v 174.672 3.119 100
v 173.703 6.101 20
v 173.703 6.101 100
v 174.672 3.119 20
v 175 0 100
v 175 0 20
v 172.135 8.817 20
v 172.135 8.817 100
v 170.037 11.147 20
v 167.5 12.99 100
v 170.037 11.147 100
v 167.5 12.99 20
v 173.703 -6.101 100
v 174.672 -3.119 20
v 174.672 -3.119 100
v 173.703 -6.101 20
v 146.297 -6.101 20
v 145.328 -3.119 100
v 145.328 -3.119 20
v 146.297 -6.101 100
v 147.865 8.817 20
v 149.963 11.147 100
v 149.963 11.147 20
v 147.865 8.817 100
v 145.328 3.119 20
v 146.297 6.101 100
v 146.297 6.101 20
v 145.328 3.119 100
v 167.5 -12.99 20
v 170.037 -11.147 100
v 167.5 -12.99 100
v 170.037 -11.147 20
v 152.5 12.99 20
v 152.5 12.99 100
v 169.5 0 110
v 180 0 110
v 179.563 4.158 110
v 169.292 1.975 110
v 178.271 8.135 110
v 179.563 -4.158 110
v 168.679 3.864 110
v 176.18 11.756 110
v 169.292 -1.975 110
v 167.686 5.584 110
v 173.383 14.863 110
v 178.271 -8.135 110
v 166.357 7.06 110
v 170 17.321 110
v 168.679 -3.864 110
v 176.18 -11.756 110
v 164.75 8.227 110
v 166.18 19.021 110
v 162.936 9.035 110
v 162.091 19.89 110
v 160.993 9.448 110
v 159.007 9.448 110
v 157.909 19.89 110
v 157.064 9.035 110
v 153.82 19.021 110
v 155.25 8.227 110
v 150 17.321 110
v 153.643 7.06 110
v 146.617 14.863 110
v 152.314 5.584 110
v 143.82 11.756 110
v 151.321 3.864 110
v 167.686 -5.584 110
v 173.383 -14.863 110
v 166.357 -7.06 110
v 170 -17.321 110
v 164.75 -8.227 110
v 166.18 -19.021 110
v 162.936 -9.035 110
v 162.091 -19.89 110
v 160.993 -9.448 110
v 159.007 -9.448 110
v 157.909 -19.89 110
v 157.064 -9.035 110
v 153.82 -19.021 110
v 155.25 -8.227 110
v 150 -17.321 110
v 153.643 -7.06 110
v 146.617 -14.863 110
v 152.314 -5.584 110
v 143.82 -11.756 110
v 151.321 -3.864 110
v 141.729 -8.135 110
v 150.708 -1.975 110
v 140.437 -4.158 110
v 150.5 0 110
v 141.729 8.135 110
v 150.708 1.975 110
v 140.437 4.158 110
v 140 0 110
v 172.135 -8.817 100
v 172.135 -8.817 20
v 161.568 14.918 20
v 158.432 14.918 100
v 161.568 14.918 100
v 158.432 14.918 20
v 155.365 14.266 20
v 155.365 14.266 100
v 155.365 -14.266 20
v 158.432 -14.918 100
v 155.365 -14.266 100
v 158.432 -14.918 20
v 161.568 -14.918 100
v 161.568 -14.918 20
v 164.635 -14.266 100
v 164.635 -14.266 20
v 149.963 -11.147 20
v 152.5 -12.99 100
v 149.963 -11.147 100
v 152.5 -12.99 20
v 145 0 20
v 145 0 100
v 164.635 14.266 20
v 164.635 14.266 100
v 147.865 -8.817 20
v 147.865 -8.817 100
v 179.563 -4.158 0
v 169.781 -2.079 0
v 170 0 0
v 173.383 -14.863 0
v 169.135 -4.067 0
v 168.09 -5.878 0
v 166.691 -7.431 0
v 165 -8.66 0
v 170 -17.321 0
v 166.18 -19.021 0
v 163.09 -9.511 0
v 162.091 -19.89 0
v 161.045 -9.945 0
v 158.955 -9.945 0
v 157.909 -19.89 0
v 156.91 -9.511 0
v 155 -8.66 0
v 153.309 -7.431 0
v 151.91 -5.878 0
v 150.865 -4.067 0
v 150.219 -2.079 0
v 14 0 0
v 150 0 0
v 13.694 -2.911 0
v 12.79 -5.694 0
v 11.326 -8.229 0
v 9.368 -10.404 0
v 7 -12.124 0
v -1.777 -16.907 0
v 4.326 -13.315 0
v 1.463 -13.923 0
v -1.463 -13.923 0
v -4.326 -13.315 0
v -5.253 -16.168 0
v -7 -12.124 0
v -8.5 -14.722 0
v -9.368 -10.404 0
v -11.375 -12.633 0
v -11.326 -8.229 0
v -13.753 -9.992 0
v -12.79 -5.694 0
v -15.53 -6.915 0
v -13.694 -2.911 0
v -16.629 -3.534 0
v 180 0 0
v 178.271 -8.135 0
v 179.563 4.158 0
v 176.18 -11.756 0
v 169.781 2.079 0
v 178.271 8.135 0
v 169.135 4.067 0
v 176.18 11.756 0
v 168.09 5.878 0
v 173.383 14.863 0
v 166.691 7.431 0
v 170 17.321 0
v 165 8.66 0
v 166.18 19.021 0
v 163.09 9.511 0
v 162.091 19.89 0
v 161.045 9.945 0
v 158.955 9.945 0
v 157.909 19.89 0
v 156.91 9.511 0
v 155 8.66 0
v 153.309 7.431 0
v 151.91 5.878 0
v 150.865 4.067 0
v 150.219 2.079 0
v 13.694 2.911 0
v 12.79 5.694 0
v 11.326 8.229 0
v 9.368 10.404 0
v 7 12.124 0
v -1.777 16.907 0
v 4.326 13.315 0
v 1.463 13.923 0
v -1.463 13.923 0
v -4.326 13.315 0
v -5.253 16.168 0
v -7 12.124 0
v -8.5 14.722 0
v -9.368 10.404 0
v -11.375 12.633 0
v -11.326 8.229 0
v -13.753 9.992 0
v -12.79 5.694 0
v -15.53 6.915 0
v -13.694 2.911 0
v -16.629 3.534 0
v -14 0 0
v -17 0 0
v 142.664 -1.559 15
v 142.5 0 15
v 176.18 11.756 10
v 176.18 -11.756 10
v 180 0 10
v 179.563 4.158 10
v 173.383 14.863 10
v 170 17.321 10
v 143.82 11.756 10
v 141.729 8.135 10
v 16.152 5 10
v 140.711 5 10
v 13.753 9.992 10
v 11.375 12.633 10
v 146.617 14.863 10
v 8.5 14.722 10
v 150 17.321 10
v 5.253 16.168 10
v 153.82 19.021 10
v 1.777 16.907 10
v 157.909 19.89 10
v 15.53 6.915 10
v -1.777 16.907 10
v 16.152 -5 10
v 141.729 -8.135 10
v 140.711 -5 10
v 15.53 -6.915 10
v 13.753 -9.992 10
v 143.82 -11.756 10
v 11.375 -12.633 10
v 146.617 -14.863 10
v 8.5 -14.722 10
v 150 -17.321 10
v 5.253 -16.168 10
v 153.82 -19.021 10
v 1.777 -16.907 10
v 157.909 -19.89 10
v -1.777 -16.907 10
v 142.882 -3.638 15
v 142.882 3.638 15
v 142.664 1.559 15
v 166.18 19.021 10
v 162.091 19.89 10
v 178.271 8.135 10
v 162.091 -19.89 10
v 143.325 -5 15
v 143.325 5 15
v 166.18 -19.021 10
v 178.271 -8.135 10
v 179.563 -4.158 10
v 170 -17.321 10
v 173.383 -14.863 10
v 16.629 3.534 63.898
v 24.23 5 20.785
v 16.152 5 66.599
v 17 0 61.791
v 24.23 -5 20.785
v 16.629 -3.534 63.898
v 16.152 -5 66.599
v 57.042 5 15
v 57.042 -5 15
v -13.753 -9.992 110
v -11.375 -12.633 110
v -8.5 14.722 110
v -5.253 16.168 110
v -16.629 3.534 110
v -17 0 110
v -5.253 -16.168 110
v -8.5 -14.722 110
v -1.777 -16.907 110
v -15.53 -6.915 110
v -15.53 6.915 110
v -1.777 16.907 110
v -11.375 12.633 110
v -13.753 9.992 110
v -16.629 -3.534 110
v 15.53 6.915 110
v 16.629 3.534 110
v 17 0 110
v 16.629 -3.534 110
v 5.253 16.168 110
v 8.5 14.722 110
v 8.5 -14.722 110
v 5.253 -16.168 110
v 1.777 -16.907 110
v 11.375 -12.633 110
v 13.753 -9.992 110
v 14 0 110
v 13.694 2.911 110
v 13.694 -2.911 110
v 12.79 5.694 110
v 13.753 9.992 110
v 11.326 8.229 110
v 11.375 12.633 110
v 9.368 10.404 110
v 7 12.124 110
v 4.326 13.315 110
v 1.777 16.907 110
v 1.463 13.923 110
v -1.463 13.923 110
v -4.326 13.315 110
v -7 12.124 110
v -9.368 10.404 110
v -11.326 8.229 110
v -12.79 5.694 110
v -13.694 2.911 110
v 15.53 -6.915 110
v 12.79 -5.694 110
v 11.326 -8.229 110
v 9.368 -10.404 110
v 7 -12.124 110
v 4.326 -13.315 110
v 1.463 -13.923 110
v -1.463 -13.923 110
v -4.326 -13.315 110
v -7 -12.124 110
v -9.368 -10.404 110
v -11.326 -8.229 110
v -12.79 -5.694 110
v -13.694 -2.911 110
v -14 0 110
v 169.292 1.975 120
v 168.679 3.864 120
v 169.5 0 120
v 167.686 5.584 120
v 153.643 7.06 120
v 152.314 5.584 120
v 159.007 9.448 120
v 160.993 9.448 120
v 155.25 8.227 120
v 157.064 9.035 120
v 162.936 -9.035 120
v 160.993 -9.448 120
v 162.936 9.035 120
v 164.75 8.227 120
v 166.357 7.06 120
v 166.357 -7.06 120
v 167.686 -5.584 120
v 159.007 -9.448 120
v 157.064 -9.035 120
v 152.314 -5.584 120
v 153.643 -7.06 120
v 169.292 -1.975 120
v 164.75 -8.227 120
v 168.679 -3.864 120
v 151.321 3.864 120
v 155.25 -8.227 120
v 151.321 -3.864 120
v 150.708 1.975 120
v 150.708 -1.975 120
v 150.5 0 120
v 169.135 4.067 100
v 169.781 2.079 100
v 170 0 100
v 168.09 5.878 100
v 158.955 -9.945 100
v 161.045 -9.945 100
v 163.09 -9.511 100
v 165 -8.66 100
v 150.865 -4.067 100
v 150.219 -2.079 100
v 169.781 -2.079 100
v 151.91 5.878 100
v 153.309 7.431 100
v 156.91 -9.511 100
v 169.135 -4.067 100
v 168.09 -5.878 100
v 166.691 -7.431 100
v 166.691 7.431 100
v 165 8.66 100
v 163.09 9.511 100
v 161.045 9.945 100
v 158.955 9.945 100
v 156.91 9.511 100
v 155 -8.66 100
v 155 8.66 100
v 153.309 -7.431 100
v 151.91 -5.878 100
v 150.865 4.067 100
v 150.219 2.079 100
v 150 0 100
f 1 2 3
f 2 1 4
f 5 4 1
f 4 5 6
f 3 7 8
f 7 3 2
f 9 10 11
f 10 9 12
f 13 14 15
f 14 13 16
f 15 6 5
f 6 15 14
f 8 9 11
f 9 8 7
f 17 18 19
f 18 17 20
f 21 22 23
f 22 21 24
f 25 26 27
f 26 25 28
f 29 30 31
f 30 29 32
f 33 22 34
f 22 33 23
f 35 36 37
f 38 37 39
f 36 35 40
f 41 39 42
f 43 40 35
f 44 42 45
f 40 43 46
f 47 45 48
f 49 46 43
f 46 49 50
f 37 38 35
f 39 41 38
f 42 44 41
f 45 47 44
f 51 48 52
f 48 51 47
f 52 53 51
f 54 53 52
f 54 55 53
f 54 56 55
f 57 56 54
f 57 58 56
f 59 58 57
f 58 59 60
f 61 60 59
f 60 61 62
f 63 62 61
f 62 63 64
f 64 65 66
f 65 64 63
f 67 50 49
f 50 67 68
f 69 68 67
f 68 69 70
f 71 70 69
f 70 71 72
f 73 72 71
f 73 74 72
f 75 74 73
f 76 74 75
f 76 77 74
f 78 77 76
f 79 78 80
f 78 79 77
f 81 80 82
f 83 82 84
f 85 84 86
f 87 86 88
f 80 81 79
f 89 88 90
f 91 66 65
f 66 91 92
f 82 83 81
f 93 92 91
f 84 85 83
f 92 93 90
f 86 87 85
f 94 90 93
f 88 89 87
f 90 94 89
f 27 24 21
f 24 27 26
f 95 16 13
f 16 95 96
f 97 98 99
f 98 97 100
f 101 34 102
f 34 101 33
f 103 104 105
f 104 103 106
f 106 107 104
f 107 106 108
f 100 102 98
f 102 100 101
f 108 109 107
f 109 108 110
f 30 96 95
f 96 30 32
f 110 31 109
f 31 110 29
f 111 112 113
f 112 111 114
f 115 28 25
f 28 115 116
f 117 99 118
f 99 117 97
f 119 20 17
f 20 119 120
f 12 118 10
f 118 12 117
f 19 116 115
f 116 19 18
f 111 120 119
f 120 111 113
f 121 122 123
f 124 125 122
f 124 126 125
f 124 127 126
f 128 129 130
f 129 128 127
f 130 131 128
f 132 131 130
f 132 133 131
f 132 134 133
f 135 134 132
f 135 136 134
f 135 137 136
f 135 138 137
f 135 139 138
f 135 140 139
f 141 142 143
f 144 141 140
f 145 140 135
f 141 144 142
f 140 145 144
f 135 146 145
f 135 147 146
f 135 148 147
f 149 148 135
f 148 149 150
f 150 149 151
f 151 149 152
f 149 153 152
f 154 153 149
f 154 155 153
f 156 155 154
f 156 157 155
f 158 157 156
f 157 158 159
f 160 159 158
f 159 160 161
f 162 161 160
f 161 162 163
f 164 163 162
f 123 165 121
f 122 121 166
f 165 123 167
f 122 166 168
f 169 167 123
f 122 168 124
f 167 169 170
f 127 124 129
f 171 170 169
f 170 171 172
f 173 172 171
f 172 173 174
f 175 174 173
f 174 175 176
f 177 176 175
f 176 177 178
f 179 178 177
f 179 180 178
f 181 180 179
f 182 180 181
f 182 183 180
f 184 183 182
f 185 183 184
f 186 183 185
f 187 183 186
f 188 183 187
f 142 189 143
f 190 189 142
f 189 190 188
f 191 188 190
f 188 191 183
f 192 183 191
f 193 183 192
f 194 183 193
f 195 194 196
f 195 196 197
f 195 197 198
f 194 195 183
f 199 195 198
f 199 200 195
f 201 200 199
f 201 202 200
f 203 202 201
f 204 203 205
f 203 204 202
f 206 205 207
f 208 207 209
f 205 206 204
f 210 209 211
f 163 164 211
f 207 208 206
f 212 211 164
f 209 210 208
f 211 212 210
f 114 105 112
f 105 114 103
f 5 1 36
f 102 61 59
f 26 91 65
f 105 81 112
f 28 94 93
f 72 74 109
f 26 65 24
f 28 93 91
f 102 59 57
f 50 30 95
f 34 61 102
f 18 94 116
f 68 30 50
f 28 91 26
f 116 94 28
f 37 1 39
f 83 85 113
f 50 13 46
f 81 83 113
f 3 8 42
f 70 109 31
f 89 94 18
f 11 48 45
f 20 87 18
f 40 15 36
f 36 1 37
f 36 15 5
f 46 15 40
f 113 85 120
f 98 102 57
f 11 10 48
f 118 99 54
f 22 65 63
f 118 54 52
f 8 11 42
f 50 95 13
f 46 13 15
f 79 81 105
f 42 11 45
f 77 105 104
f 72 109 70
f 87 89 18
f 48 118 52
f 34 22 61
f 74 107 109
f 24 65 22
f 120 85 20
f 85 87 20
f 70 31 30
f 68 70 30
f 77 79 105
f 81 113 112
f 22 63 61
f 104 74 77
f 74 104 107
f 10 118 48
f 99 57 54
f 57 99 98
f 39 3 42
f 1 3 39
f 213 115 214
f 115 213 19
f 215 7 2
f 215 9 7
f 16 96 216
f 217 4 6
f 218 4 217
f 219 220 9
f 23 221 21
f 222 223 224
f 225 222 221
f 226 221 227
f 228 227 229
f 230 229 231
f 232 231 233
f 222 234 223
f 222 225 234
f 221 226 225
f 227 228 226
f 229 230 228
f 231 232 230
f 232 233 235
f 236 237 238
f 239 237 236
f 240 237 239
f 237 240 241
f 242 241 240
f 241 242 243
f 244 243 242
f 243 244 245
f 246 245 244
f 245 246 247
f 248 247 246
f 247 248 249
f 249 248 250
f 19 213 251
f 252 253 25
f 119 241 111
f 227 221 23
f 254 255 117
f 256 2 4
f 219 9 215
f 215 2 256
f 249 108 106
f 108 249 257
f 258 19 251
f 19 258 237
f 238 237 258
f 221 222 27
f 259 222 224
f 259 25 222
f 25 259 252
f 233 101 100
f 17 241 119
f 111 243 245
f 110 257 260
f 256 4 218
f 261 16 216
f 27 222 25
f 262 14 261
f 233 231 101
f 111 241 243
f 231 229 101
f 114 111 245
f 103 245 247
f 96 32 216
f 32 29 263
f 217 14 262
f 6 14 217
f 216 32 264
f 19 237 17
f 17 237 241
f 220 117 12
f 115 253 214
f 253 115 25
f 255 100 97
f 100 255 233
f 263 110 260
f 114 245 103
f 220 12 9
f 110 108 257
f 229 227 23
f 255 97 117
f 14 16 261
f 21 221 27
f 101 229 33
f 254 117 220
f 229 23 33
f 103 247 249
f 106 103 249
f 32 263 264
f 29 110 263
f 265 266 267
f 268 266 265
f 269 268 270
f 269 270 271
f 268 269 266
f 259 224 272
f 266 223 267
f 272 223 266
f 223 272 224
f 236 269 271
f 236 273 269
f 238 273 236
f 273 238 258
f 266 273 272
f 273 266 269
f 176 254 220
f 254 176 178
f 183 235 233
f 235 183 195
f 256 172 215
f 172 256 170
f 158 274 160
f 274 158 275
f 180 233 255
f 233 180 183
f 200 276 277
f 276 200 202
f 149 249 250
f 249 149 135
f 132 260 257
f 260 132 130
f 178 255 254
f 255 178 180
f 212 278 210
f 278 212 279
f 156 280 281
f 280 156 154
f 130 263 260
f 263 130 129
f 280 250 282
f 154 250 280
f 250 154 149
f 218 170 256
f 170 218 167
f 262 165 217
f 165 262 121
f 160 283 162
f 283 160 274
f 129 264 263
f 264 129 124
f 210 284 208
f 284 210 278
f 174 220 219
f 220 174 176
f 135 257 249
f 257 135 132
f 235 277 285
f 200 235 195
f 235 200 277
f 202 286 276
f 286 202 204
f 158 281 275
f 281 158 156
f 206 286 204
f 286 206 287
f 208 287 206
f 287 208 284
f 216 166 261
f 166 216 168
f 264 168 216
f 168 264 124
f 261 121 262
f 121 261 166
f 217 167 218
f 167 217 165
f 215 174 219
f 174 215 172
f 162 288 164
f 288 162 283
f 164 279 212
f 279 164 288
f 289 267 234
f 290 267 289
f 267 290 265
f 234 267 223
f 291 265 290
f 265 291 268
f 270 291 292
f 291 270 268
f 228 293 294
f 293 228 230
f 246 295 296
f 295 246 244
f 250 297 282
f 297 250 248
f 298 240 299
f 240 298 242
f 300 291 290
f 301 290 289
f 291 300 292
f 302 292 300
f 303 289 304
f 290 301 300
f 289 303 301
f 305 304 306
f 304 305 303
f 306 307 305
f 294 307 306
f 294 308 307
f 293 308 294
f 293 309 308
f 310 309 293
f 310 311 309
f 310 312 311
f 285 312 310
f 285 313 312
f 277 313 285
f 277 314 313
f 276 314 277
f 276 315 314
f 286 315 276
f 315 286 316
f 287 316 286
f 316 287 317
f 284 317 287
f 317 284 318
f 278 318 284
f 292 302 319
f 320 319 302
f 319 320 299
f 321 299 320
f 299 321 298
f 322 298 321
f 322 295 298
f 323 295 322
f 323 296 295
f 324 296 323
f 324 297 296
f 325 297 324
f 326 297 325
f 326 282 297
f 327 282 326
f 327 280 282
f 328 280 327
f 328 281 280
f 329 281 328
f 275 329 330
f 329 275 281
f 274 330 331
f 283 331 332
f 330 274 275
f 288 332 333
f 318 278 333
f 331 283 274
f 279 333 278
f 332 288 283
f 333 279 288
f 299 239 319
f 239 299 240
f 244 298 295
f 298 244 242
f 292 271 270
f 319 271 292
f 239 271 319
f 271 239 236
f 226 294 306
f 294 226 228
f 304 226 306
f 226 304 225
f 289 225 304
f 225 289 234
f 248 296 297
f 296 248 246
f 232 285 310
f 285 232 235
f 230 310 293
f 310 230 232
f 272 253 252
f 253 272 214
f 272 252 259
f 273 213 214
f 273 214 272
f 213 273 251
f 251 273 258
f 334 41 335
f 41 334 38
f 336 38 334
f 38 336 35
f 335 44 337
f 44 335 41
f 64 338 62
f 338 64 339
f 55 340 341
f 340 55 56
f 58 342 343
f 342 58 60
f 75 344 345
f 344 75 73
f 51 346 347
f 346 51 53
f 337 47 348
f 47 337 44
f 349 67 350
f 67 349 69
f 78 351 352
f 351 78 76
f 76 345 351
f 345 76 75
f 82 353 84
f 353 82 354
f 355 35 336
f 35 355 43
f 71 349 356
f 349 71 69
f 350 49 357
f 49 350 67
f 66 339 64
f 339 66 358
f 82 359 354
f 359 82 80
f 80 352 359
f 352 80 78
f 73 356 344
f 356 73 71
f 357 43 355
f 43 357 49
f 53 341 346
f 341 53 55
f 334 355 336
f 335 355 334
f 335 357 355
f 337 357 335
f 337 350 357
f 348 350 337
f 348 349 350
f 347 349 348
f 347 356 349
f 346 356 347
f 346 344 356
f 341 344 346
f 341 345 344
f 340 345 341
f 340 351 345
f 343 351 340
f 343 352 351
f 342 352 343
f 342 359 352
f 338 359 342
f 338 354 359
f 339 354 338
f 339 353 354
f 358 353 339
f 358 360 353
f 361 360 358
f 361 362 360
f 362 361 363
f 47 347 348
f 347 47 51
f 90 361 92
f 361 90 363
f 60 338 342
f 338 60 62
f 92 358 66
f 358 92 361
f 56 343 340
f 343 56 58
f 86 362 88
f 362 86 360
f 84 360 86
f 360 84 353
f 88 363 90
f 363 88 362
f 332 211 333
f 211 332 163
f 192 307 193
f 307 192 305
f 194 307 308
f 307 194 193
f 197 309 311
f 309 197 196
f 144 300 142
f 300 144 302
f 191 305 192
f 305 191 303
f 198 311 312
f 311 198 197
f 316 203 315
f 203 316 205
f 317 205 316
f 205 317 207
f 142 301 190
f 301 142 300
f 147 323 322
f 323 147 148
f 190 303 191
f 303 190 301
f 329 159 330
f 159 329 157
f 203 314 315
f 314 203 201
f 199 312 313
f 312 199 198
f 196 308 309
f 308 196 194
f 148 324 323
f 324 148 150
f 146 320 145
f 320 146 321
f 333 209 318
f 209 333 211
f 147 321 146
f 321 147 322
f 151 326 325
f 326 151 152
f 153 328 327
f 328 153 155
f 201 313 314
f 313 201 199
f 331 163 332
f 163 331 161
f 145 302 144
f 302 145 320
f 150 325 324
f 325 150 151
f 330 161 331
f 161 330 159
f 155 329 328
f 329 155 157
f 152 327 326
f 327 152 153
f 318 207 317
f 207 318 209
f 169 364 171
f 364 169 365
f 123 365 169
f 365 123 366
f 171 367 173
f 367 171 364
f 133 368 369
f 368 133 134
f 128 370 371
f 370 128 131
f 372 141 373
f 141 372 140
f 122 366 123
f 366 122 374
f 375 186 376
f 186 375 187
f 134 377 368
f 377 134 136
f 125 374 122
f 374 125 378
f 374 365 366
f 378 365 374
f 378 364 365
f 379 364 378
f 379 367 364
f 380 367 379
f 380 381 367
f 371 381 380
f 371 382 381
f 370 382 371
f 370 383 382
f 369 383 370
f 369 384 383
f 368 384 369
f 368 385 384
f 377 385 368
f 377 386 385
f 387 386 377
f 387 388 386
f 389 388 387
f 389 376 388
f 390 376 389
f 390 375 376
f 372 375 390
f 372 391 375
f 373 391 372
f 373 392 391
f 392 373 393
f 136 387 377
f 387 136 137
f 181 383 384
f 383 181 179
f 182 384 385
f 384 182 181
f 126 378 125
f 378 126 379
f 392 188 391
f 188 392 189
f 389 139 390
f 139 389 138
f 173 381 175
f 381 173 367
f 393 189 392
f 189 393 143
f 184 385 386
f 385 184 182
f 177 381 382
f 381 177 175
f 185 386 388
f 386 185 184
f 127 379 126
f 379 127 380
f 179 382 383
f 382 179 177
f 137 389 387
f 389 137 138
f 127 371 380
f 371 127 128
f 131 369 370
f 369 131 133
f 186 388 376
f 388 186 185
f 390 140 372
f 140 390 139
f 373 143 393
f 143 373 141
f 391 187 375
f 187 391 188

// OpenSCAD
/*

Spool bar-holder

Fernando Jerez 2017

*/

rod_tube_diameter = 28;
spool_tube_diameter = 30;
spool_height = 80;
length = 160;
pin = "Yes"; // [Yes:Yes, No:No]

/* [Hidden] */

thickness = 3;
height = spool_height+20;
tube = rod_tube_diameter;
spooltube = spool_tube_diameter;


difference(){
    union(){
        hull(){
            cylinder(r = thickness+(tube/2),h = 10);
            translate([length,0,0]) cylinder(r = 5+(spooltube/2),h = 10);
        }
        cylinder(r = thickness+(tube/2),h = 10+height);
        translate([length,0,0]){
            cylinder(r = (spooltube/2),h = 10+height);
            translate([0,0,height]) cylinder(r1 = (spooltube/2), r2 = 5+(spooltube/2), h=10);
            translate([0,0,10]) cylinder( r1 = 5+(spooltube/2), r2 = (spooltube/2), h=10);
        }
        
        translate([0,-5,10]) cube([length,10,5]);
        translate([tube/2-8,-5,9]){
            rotate([0,-10,0]) cube([20,10,height*0.66]);
            translate([0,0,15]) rotate([0,100,0]) cube([10,10,height*0.66]);
        }
        if(pin=="Yes"){
            translate([length,0,height+10]) cylinder(r = 9.5,h = 10);
        }
    }
        
    
    cylinder(r = (tube/2),h = 10+height+0.1);
    translate([length,0,0]) cylinder(r = (10),h = height);
    
}
